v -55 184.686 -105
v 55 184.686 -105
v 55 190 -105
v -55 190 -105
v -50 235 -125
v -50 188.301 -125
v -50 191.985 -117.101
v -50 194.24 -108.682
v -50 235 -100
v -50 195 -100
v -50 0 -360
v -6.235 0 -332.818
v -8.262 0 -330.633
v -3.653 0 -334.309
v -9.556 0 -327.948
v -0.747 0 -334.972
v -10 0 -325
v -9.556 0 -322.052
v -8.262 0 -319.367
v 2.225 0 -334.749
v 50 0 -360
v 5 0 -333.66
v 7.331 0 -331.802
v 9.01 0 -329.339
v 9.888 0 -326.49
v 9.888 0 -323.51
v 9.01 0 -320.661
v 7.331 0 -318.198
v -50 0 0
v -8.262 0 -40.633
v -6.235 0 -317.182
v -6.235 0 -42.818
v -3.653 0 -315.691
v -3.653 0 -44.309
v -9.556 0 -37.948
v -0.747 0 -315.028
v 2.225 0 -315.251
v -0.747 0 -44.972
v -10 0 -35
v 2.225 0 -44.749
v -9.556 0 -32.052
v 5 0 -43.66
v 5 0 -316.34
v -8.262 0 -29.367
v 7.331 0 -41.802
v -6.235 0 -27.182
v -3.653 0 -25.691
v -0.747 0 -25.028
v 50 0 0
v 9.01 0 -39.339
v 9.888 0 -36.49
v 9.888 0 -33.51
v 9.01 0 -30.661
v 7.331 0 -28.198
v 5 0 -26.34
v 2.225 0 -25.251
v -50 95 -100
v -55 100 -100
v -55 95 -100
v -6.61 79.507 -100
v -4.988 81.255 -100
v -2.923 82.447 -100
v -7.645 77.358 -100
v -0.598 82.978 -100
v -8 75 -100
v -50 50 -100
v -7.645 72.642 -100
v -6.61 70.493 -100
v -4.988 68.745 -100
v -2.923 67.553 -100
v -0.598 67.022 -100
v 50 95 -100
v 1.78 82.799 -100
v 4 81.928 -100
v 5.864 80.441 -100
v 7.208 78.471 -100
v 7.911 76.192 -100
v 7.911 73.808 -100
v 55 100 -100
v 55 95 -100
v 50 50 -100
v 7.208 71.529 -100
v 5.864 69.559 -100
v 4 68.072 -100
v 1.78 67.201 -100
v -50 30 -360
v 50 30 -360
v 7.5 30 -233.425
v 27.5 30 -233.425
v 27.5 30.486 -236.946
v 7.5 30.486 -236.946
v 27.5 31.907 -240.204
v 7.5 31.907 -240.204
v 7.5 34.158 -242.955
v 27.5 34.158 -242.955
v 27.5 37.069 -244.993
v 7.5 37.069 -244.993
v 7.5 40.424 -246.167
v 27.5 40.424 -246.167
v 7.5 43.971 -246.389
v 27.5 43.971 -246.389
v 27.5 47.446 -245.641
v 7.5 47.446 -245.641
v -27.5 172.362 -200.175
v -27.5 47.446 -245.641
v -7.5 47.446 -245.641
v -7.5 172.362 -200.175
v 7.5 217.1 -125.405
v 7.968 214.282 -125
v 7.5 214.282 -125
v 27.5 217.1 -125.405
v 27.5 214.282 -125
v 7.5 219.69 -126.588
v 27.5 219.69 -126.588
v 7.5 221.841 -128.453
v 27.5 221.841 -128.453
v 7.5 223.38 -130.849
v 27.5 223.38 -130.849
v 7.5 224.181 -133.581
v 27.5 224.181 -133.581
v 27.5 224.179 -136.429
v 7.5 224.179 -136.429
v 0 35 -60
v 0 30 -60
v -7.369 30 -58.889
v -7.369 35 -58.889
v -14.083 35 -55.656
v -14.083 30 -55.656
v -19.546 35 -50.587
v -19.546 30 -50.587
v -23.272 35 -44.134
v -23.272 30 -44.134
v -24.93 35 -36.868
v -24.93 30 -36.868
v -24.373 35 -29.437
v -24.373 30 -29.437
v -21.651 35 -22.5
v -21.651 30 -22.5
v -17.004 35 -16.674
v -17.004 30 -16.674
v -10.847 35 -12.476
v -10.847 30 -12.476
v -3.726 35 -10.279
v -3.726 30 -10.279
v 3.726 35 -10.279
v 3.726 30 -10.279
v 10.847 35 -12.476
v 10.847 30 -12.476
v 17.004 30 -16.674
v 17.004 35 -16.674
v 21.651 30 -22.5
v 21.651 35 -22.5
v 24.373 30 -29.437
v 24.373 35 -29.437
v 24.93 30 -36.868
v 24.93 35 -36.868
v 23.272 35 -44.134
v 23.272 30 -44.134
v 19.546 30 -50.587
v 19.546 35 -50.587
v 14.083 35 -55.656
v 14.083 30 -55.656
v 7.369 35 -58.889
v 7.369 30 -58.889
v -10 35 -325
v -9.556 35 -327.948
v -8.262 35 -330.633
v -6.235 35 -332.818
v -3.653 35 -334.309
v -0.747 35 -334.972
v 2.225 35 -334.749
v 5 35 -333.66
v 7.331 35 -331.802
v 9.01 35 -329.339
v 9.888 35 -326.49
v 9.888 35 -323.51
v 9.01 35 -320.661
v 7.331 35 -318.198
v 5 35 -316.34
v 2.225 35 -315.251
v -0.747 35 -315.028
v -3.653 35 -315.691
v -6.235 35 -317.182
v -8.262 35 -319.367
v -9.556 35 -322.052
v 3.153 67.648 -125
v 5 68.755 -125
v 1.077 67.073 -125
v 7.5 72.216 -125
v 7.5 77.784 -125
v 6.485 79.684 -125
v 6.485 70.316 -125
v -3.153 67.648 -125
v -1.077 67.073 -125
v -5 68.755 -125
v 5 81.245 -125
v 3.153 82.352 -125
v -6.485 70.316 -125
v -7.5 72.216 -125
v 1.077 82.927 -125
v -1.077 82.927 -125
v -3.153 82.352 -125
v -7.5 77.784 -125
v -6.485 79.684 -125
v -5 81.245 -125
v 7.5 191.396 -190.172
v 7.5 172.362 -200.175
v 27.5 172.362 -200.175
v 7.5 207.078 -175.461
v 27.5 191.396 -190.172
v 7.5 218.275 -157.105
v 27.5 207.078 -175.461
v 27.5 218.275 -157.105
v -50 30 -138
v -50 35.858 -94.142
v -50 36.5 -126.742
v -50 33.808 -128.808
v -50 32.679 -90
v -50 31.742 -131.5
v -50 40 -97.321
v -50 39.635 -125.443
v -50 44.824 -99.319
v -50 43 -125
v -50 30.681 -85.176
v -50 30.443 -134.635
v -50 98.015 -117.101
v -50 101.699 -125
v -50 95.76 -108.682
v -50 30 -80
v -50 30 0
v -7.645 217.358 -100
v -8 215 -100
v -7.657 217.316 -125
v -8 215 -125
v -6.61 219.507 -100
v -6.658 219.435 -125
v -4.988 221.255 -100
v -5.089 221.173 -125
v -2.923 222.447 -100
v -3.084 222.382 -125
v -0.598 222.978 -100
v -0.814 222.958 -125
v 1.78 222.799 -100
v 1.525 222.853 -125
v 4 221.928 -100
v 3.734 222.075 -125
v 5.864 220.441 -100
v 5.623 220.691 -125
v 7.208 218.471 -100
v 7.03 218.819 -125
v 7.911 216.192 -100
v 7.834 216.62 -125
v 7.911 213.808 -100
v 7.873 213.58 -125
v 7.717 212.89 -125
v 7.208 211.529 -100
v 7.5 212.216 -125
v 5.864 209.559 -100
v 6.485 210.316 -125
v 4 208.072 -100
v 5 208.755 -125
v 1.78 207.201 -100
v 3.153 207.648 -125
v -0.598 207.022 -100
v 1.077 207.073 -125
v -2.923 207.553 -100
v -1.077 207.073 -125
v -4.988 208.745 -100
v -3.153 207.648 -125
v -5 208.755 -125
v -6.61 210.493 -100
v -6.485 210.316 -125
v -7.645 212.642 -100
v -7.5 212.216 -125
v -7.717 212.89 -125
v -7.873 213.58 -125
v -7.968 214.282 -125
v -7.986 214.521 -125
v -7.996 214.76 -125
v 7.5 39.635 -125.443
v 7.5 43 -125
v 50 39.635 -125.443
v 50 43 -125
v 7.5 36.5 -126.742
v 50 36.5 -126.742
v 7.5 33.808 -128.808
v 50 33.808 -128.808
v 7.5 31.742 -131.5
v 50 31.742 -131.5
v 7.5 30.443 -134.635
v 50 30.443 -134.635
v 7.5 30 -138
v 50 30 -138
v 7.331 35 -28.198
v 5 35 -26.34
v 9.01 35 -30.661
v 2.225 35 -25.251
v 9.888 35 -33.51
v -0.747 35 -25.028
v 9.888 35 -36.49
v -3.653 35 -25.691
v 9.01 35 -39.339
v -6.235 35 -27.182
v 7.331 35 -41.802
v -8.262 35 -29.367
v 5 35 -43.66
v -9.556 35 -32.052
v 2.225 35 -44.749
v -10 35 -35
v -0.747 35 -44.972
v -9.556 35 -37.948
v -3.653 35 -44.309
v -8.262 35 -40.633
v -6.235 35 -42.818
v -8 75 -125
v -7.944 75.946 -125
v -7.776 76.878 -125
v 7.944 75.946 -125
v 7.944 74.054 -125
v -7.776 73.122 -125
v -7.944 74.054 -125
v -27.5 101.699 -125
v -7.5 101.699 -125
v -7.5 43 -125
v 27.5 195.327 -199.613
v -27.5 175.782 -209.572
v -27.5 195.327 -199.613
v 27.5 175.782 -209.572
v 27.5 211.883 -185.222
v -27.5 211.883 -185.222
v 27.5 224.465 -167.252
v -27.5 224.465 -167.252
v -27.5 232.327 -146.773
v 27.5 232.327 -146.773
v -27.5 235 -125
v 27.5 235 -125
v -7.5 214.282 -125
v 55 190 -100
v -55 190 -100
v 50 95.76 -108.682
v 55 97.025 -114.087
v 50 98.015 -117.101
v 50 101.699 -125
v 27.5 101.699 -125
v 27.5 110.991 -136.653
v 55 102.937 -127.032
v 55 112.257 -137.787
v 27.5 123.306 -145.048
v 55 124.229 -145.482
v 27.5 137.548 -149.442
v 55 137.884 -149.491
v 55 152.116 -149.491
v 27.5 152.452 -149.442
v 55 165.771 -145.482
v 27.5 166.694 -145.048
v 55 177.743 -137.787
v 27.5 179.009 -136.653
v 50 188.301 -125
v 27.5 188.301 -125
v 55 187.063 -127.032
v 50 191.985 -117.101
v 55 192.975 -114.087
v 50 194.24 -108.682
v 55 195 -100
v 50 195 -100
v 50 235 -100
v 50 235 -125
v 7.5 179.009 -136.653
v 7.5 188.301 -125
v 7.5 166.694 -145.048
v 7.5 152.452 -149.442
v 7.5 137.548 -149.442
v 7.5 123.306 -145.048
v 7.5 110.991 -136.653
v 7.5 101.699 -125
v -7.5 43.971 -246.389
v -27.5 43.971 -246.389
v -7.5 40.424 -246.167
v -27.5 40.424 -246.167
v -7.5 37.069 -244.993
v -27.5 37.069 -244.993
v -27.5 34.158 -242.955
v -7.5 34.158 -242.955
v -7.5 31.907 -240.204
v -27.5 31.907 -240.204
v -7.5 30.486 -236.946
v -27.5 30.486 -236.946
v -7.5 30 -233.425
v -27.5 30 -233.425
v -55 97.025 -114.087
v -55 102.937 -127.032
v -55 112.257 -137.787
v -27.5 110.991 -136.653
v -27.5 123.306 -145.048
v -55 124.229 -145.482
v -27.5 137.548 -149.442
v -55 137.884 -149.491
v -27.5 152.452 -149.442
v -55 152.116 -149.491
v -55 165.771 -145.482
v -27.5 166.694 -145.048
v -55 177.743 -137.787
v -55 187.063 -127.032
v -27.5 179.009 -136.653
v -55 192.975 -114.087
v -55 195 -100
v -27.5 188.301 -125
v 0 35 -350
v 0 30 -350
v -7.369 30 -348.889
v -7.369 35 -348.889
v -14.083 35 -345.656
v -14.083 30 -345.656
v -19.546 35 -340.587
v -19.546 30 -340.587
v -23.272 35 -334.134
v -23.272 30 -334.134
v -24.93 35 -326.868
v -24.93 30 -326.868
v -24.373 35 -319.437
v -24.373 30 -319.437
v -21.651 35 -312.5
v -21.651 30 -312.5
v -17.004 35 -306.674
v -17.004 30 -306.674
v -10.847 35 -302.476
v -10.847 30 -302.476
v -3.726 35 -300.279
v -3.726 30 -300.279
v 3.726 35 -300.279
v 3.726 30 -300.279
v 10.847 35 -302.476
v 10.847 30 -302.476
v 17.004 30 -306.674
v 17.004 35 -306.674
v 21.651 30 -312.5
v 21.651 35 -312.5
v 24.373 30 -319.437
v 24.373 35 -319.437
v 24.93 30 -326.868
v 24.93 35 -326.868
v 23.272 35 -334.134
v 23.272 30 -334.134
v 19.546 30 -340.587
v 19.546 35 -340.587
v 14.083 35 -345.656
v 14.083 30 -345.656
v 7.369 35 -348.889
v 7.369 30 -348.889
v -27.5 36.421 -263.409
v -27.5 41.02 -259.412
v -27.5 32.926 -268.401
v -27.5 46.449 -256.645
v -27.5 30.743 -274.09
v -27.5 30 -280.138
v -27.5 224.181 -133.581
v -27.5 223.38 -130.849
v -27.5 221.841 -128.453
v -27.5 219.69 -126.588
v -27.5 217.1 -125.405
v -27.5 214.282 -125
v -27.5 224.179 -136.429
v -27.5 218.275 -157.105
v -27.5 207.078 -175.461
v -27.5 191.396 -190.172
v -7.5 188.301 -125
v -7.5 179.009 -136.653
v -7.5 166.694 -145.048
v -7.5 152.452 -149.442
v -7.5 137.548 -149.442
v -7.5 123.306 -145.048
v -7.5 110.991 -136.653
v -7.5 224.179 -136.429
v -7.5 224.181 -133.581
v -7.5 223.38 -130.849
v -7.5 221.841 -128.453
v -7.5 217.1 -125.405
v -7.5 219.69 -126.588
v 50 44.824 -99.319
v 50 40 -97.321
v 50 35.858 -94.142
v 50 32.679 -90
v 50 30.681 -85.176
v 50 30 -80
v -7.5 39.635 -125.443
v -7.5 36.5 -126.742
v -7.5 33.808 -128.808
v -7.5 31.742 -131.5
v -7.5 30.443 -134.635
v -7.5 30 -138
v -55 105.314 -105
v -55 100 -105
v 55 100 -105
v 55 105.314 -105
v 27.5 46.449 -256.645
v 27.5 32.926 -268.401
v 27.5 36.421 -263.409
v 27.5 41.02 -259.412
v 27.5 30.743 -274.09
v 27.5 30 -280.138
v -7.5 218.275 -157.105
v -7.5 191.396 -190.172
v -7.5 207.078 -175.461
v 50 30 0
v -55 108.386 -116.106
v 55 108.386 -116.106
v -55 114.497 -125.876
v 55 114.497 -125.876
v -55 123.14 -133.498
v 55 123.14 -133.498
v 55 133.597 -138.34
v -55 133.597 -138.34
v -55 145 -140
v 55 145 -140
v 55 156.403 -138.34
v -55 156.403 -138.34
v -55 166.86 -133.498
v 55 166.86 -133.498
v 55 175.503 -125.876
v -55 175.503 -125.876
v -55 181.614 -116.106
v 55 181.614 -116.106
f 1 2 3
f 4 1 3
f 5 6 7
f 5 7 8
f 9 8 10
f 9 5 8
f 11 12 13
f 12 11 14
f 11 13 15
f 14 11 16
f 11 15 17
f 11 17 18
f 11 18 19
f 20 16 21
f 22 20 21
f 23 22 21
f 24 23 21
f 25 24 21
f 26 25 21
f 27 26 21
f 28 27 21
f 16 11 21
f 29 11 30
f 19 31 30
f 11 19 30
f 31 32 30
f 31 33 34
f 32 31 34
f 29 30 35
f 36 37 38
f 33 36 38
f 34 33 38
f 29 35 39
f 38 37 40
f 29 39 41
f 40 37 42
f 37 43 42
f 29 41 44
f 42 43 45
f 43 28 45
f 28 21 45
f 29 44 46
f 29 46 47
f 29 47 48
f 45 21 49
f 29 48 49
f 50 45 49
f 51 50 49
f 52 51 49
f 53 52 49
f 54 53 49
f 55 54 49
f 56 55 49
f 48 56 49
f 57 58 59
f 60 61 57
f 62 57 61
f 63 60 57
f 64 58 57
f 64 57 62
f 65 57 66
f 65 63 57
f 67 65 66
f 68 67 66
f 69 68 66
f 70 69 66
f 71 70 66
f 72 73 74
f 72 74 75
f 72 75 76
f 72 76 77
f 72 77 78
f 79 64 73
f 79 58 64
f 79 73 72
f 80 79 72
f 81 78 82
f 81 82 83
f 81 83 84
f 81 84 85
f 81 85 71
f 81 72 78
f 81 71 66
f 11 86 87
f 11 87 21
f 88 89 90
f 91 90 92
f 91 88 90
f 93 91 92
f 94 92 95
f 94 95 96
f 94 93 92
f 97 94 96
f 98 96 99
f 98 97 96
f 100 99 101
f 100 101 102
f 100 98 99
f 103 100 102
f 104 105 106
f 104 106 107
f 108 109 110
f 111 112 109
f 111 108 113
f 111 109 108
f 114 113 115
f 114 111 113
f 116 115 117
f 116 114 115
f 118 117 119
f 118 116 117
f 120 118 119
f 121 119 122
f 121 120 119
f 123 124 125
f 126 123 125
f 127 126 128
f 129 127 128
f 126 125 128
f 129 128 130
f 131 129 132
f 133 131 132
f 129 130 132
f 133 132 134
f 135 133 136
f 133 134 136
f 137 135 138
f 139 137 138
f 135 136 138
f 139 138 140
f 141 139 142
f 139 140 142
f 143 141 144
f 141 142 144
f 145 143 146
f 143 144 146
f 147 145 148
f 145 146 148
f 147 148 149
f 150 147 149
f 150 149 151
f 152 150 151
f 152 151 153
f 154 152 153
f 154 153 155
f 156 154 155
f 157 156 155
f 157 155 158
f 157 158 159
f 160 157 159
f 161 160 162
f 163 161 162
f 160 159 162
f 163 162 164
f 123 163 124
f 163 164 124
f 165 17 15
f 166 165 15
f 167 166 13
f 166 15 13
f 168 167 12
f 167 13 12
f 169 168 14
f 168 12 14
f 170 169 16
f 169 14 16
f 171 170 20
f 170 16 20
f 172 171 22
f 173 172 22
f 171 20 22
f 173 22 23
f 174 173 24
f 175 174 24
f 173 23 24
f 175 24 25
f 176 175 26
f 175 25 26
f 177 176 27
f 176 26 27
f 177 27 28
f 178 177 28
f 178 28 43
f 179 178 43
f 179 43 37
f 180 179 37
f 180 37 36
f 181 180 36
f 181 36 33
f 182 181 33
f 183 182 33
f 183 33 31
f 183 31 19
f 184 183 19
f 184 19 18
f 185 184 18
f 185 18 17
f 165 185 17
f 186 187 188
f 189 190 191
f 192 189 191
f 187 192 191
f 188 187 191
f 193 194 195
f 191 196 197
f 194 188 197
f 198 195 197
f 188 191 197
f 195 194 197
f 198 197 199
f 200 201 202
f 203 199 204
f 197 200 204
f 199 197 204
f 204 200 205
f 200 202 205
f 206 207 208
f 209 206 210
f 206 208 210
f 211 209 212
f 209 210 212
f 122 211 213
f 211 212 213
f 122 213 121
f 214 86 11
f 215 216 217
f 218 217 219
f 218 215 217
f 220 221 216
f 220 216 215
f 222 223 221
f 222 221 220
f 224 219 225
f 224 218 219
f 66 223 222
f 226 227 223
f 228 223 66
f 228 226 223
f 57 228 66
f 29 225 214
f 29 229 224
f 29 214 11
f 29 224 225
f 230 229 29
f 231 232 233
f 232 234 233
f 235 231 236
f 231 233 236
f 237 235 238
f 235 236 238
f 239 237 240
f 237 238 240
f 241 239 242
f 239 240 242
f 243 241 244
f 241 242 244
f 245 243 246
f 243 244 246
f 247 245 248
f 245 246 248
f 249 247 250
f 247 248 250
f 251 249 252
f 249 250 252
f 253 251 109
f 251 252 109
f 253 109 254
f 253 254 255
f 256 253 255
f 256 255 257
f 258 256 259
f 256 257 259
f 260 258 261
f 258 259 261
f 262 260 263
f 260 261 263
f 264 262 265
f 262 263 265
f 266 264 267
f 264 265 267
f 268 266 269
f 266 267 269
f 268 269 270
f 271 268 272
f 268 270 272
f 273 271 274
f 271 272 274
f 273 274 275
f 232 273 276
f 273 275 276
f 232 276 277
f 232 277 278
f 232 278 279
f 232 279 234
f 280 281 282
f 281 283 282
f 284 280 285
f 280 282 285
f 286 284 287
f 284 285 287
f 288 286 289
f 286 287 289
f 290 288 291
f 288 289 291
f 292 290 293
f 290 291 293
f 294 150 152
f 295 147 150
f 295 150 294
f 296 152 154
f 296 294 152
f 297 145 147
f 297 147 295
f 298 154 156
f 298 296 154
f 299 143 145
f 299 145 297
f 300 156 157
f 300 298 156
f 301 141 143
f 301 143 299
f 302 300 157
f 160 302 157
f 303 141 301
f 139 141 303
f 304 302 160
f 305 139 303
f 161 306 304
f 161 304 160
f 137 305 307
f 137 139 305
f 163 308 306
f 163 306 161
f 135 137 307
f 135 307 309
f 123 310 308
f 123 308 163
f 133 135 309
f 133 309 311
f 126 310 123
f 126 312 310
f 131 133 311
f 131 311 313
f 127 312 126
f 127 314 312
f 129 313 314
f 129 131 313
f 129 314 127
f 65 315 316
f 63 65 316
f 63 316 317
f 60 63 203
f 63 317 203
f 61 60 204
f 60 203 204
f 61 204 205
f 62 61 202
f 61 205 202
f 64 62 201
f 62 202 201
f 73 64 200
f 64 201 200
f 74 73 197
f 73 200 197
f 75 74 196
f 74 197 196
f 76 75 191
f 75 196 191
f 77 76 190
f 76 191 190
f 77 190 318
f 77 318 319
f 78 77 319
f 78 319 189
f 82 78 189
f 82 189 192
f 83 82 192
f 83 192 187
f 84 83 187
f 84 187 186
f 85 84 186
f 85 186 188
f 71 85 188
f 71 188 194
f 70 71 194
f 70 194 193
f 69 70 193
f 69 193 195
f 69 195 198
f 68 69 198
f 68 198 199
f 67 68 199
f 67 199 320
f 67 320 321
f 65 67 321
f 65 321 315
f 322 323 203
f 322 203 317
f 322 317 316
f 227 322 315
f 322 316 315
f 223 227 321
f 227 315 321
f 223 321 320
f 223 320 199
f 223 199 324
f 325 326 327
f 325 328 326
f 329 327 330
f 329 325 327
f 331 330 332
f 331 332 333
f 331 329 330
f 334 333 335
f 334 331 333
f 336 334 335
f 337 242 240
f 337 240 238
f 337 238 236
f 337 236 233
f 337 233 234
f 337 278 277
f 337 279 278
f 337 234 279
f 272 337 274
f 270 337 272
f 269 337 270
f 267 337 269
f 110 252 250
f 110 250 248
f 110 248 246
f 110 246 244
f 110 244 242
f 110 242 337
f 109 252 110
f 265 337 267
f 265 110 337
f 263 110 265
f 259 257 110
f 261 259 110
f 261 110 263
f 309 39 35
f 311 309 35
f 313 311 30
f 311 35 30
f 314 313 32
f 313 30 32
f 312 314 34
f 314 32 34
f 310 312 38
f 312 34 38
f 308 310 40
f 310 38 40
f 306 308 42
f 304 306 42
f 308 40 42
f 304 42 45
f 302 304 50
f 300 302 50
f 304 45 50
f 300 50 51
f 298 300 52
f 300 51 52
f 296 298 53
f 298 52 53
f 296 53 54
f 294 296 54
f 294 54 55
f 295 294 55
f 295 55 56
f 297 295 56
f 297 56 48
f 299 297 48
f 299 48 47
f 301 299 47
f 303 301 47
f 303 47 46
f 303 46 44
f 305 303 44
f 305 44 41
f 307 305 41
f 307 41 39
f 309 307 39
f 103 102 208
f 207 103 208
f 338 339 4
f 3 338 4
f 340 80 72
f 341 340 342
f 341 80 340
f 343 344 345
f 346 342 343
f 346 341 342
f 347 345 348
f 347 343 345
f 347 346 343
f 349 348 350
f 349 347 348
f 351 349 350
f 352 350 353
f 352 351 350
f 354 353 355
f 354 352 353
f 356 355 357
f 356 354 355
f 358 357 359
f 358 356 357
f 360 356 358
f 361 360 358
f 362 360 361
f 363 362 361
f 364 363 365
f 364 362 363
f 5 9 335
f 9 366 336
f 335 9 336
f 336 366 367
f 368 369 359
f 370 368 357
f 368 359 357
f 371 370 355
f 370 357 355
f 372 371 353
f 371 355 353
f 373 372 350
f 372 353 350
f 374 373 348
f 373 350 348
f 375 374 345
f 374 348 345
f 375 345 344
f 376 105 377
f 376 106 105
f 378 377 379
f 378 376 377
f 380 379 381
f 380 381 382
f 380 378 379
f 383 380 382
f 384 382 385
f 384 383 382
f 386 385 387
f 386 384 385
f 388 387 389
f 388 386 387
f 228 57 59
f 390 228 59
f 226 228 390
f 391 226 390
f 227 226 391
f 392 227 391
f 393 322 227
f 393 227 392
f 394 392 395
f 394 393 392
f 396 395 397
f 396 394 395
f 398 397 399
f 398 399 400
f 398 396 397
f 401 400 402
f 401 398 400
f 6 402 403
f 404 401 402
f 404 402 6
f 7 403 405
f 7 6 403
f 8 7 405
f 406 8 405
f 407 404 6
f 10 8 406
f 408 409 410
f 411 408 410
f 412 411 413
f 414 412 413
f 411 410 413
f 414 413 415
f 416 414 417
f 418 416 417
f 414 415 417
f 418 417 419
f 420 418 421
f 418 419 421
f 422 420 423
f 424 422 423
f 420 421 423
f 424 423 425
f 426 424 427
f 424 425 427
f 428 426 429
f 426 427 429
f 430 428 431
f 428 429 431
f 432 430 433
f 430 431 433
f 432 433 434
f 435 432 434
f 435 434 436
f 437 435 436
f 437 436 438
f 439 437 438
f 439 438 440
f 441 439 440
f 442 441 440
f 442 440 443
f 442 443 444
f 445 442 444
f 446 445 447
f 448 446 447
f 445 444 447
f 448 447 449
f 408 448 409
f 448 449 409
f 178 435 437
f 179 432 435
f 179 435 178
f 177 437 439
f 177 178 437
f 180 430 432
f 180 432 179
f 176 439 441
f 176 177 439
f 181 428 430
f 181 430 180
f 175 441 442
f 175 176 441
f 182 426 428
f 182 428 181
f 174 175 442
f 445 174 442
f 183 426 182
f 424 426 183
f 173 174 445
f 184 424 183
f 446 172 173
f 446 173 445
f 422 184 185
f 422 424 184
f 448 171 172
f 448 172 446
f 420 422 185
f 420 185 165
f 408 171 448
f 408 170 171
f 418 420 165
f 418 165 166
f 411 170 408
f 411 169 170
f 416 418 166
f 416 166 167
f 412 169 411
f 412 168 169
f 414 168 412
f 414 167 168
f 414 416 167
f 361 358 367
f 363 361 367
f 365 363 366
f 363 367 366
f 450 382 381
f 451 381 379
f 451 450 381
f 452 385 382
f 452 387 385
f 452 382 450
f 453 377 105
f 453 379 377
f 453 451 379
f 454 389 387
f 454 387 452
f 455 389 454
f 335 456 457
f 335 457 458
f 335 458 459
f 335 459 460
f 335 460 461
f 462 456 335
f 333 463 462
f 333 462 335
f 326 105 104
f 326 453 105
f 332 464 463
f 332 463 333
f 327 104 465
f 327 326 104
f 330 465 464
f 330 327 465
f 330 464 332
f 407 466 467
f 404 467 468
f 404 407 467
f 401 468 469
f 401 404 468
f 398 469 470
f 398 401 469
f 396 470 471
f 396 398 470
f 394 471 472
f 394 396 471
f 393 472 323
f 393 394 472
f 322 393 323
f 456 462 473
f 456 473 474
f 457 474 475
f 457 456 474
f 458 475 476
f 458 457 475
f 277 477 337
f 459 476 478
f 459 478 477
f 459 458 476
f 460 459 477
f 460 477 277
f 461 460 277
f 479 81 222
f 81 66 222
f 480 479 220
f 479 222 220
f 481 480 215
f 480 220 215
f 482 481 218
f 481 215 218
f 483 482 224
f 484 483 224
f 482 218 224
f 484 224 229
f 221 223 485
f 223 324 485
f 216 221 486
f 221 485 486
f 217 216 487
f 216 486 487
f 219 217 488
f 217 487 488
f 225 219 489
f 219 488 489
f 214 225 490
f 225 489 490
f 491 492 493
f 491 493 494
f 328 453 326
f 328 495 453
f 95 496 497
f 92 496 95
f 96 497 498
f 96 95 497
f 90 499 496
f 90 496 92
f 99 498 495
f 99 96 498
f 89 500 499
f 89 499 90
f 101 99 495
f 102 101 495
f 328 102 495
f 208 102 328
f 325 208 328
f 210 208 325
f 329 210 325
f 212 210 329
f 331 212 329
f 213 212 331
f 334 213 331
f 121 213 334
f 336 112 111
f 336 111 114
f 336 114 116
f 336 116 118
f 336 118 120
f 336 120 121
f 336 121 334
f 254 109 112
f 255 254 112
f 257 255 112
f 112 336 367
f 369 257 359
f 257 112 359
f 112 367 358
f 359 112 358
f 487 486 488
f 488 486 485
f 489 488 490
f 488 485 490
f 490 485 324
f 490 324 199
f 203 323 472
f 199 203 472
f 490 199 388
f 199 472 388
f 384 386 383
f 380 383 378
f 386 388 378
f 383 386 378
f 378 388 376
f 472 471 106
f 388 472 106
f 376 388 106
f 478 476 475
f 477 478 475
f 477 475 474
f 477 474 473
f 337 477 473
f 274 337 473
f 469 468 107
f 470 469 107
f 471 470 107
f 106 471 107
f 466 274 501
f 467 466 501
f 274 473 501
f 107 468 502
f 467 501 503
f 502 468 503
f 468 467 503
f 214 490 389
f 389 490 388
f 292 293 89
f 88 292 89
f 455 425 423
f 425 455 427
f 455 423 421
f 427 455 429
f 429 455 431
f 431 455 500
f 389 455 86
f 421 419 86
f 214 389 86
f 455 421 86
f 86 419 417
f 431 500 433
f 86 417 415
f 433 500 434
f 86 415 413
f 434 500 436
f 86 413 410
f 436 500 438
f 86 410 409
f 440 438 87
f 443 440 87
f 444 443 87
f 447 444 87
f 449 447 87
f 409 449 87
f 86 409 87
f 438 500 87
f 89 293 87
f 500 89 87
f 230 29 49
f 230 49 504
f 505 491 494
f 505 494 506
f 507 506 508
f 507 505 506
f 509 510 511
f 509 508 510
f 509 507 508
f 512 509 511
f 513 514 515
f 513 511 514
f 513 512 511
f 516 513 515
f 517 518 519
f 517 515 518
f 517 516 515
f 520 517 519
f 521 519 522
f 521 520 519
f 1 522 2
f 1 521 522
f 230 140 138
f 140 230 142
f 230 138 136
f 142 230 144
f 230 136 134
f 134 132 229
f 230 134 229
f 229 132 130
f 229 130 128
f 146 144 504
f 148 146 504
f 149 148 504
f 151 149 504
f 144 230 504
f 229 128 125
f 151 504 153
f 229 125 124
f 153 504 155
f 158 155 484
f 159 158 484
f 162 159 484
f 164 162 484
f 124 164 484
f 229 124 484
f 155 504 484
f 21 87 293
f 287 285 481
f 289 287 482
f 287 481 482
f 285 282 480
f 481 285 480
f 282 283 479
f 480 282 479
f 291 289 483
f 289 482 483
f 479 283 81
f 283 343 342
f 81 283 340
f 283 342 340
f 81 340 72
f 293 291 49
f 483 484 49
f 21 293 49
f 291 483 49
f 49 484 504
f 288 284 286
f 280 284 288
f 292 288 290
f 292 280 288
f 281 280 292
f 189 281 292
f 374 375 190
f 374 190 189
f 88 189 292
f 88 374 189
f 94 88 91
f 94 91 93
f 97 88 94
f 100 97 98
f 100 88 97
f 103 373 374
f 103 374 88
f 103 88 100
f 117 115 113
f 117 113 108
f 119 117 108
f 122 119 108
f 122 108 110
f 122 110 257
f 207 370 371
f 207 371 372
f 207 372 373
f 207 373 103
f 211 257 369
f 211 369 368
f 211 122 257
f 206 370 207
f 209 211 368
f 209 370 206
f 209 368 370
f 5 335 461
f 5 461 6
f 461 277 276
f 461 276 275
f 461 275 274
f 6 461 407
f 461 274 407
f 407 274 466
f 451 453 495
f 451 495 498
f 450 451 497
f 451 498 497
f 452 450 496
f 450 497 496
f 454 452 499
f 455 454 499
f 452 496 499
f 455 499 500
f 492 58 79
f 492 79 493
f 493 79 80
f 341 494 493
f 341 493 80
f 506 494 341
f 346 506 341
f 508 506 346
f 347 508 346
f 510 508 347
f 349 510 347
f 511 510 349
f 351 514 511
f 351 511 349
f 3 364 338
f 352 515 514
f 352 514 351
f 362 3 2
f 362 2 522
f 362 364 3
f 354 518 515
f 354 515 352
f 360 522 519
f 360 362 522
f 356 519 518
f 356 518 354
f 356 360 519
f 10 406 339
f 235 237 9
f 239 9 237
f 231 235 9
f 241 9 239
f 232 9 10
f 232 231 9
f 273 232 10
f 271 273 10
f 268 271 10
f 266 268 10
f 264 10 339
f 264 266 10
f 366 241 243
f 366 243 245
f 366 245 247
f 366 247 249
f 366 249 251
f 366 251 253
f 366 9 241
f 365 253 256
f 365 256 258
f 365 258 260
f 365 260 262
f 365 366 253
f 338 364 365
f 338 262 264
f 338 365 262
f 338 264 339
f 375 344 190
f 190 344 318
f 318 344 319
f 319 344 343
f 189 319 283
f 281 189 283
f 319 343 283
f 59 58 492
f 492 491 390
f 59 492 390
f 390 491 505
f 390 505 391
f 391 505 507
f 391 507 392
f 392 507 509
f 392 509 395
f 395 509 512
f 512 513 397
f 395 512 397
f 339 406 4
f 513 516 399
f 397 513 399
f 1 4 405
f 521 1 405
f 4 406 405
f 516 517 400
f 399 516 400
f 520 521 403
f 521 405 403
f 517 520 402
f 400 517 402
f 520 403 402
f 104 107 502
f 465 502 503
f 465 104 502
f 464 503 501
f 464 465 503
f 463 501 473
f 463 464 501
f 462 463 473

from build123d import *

# Parameters (mm, degrees)
BOSS_EXTRUDE1_DEPTH     = 50
BOSS_EXTRUDE2_DEPTH     = 55
BOSS_EXTRUDE3_DEPTH     = 27.5
CUT_EXTRUDE1_DEPTH      = 20
CUT_EXTRUDE2_DEPTH      = 434.416658655
CUT_EXTRUDE2_DEPTH_BACK = 434.416658655
CUT_EXTRUDE3_DEPTH      = 444.762323773
CUT_EXTRUDE3_DEPTH_BACK = 444.762323773
SKETCH6_W               = 10
SKETCH6_H               = 90
SKETCH7_R               = 25
BOSS_EXTRUDE4_DEPTH     = 5
LPATTERN1_COUNT         = 2
LPATTERN1_PITCH         = 290
HOLE1_D                 = 20
HOLE2_D                 = 16
HOLE2_DEPTH             = 25
LPATTERN2_COUNT         = 2
LPATTERN2_PITCH         = 140
FILLET1_R               = 25
FILLET2_R               = 13
FILLET3_R               = 20
FILLET4_R               = 10


with BuildPart() as part:
    # Sketch1 → Boss-Extrude1 (new, symmetric)
    with BuildSketch(Plane(origin=(0, 0, 0), x_dir=(0, 0, -1), z_dir=(1, 0, 0))):
        Polygon((0, 0), (0, 30), (100, 30), (100, 235), (125, 235), (125, 30), (360, 30), (360, 0), align=None)
    extrude(amount=BOSS_EXTRUDE1_DEPTH, both=True)

    # Sketch2 → Boss-Extrude2 (add, symmetric)
    with BuildSketch(Plane(origin=(0, 0, 0), x_dir=(0, 0, -1), z_dir=(1, 0, 0))):
        with BuildLine():
            Line((100, 195), (100, 95))
            ThreePointArc((100, 95), (150, 145), (100, 195))
        make_face()
    extrude(amount=BOSS_EXTRUDE2_DEPTH, both=True)

    # Sketch3 → Boss-Extrude3 (add, symmetric)
    with BuildSketch(Plane(origin=(0, 0, 0), x_dir=(0, 0, -1), z_dir=(1, 0, 0))):
        with BuildLine():
            Line((125, 235), (125, 30))
            Line((125, 30), (262.632576463, 30))
            Line((262.632576463, 30), (209.572335871, 175.781812899))
            ThreePointArc((209.572335871, 175.781812899), (176.621879272, 218.723683986), (125, 235))
        make_face()
    extrude(amount=BOSS_EXTRUDE3_DEPTH, both=True)

    # Sketch4 → Cut-Extrude1 (cut)
    with BuildSketch(Plane(origin=(27.5, 0, 0), x_dir=(0, 0, -1), z_dir=(1, 0, 0))):
        with BuildLine():
            Line((125, 225), (125, 188.301270189))
            ThreePointArc((125, 188.301270189), (150, 145), (125, 101.698729811))
            Line((125, 101.698729811), (125, 30))
            Line((125, 30), (251.990798739, 30))
            Line((251.990798739, 30), (200.175409663, 172.361611466))
            ThreePointArc((200.175409663, 172.361611466), (170.886114908, 210.532163543), (125, 225))
        make_face()
    cut_extrude1 = extrude(amount=-CUT_EXTRUDE1_DEPTH, mode=Mode.SUBTRACT)

    # Mirror1: Cut-Extrude1 across plane
    add(cut_extrude1.mirror(Plane(origin=(0, 0, 0), x_dir=(0, 0, 1), z_dir=(1, 0, 0))), mode=Mode.SUBTRACT)

    # Sketch5 → Cut-Extrude2 (cut, two sides: drawn at the far end of the back side and taken through both)
    with BuildSketch(Plane(origin=(0, 0, 0), x_dir=(0, 0, -1), z_dir=(1, 0, 0)).offset(-CUT_EXTRUDE2_DEPTH_BACK)):
        with BuildLine():
            Line((100, 185), (100, 105))
            ThreePointArc((100, 105), (140, 145), (100, 185))
        make_face()
    extrude(amount=CUT_EXTRUDE2_DEPTH + CUT_EXTRUDE2_DEPTH_BACK, mode=Mode.SUBTRACT)

    # Sketch6 → Cut-Extrude3 (cut, two sides: drawn at the far end of the back side and taken through both)
    with BuildSketch(Plane(origin=(55, 0, 0), x_dir=(0, 0, -1), z_dir=(1, 0, 0)).offset(-CUT_EXTRUDE3_DEPTH_BACK)):
        with Locations((100, 145)):
            Rectangle(SKETCH6_W, SKETCH6_H)
    extrude(amount=CUT_EXTRUDE3_DEPTH + CUT_EXTRUDE3_DEPTH_BACK, mode=Mode.SUBTRACT)

    # Sketch7 → Boss-Extrude4 (add)
    with BuildSketch(Plane(origin=(0, 30, 0), x_dir=(1, 0, 0), z_dir=(0, 1, 0))):
        with Locations(Location((0, 35, 0), (0, 0, 90))):
            Circle(SKETCH7_R)
    boss_extrude4 = extrude(amount=BOSS_EXTRUDE4_DEPTH)

    # LPattern1: Boss-Extrude4 ×2
    with Locations(*[(0, 0, -i * LPATTERN1_PITCH) for i in range(1, LPATTERN1_COUNT)]):
        add(boss_extrude4)

    # Hole1 (through all)
    with Locations(Plane(origin=(0, 35, 0), x_dir=(1, 0, 0), z_dir=(0, 1, 0))):
        with Locations((0, 35), (0, 325)):
            Hole(HOLE1_D / 2)

    # Hole2
    with Locations(Plane.XY.offset(-100)):
        with Locations((0, 215)):
            hole2 = Hole(HOLE2_D / 2, depth=HOLE2_DEPTH)

    # LPattern2: Hole2 ×2
    with Locations(*[(0, -i * LPATTERN2_PITCH, 0) for i in range(1, LPATTERN2_COUNT)]):
        add(hole2, mode=Mode.SUBTRACT)

    # Fillet1
    fillet1_edges = [part.edges().sort_by_distance(p)[0] for p in [
        (0, 30, -262.632576463),
    ]]
    fillet(fillet1_edges, radius=FILLET1_R)

    # Fillet2
    fillet2_edges = [part.edges().sort_by_distance(p)[0] for p in [
        (28.75, 30, -125),
        (-28.75, 30, -125),
        (17.5, 30, -251.990798739),
        (-17.5, 30, -251.990798739),
    ]]
    fillet(fillet2_edges, radius=FILLET2_R)

    # Fillet3
    fillet3_edges = [part.edges().sort_by_distance(p)[0] for p in [
        (0, 30, -100),
    ]]
    fillet(fillet3_edges, radius=FILLET3_R)

    # Fillet4
    # the kernel refuses this fillet: 10 mm, written as the material it adds along each edge
    with BuildSketch(Plane(origin=(27.5, 225, -125), x_dir=(0, -1, 0), z_dir=(-1, 0, 0))) as fillet4_piece_1:
        with BuildLine():
            CenterArc((10.717967697, -10), FILLET4_R, 90, 98.213210702)
            ThreePointArc((0.820534511, -11.428571429), (0.205397303, -5.728994715), (0, 0))
            Line((0, 0), (10.717967697, 0))
        make_face()
    extrude(amount=48.644973575)
    with BuildSketch(Plane(origin=(-27.5, 225, -125), x_dir=(0, -1, 0), z_dir=(1, 0, 0))) as fillet4_piece_2:
        with BuildLine():
            CenterArc((10.717967697, 10), FILLET4_R, 171.786789298, 98.213210702)
            ThreePointArc((0.820534511, 11.428571429), (0.205397303, 5.728994715), (0, 0))
            Line((0, 0), (10.717967697, 0))
        make_face()
    extrude(amount=48.644973575)


solid = part.part
